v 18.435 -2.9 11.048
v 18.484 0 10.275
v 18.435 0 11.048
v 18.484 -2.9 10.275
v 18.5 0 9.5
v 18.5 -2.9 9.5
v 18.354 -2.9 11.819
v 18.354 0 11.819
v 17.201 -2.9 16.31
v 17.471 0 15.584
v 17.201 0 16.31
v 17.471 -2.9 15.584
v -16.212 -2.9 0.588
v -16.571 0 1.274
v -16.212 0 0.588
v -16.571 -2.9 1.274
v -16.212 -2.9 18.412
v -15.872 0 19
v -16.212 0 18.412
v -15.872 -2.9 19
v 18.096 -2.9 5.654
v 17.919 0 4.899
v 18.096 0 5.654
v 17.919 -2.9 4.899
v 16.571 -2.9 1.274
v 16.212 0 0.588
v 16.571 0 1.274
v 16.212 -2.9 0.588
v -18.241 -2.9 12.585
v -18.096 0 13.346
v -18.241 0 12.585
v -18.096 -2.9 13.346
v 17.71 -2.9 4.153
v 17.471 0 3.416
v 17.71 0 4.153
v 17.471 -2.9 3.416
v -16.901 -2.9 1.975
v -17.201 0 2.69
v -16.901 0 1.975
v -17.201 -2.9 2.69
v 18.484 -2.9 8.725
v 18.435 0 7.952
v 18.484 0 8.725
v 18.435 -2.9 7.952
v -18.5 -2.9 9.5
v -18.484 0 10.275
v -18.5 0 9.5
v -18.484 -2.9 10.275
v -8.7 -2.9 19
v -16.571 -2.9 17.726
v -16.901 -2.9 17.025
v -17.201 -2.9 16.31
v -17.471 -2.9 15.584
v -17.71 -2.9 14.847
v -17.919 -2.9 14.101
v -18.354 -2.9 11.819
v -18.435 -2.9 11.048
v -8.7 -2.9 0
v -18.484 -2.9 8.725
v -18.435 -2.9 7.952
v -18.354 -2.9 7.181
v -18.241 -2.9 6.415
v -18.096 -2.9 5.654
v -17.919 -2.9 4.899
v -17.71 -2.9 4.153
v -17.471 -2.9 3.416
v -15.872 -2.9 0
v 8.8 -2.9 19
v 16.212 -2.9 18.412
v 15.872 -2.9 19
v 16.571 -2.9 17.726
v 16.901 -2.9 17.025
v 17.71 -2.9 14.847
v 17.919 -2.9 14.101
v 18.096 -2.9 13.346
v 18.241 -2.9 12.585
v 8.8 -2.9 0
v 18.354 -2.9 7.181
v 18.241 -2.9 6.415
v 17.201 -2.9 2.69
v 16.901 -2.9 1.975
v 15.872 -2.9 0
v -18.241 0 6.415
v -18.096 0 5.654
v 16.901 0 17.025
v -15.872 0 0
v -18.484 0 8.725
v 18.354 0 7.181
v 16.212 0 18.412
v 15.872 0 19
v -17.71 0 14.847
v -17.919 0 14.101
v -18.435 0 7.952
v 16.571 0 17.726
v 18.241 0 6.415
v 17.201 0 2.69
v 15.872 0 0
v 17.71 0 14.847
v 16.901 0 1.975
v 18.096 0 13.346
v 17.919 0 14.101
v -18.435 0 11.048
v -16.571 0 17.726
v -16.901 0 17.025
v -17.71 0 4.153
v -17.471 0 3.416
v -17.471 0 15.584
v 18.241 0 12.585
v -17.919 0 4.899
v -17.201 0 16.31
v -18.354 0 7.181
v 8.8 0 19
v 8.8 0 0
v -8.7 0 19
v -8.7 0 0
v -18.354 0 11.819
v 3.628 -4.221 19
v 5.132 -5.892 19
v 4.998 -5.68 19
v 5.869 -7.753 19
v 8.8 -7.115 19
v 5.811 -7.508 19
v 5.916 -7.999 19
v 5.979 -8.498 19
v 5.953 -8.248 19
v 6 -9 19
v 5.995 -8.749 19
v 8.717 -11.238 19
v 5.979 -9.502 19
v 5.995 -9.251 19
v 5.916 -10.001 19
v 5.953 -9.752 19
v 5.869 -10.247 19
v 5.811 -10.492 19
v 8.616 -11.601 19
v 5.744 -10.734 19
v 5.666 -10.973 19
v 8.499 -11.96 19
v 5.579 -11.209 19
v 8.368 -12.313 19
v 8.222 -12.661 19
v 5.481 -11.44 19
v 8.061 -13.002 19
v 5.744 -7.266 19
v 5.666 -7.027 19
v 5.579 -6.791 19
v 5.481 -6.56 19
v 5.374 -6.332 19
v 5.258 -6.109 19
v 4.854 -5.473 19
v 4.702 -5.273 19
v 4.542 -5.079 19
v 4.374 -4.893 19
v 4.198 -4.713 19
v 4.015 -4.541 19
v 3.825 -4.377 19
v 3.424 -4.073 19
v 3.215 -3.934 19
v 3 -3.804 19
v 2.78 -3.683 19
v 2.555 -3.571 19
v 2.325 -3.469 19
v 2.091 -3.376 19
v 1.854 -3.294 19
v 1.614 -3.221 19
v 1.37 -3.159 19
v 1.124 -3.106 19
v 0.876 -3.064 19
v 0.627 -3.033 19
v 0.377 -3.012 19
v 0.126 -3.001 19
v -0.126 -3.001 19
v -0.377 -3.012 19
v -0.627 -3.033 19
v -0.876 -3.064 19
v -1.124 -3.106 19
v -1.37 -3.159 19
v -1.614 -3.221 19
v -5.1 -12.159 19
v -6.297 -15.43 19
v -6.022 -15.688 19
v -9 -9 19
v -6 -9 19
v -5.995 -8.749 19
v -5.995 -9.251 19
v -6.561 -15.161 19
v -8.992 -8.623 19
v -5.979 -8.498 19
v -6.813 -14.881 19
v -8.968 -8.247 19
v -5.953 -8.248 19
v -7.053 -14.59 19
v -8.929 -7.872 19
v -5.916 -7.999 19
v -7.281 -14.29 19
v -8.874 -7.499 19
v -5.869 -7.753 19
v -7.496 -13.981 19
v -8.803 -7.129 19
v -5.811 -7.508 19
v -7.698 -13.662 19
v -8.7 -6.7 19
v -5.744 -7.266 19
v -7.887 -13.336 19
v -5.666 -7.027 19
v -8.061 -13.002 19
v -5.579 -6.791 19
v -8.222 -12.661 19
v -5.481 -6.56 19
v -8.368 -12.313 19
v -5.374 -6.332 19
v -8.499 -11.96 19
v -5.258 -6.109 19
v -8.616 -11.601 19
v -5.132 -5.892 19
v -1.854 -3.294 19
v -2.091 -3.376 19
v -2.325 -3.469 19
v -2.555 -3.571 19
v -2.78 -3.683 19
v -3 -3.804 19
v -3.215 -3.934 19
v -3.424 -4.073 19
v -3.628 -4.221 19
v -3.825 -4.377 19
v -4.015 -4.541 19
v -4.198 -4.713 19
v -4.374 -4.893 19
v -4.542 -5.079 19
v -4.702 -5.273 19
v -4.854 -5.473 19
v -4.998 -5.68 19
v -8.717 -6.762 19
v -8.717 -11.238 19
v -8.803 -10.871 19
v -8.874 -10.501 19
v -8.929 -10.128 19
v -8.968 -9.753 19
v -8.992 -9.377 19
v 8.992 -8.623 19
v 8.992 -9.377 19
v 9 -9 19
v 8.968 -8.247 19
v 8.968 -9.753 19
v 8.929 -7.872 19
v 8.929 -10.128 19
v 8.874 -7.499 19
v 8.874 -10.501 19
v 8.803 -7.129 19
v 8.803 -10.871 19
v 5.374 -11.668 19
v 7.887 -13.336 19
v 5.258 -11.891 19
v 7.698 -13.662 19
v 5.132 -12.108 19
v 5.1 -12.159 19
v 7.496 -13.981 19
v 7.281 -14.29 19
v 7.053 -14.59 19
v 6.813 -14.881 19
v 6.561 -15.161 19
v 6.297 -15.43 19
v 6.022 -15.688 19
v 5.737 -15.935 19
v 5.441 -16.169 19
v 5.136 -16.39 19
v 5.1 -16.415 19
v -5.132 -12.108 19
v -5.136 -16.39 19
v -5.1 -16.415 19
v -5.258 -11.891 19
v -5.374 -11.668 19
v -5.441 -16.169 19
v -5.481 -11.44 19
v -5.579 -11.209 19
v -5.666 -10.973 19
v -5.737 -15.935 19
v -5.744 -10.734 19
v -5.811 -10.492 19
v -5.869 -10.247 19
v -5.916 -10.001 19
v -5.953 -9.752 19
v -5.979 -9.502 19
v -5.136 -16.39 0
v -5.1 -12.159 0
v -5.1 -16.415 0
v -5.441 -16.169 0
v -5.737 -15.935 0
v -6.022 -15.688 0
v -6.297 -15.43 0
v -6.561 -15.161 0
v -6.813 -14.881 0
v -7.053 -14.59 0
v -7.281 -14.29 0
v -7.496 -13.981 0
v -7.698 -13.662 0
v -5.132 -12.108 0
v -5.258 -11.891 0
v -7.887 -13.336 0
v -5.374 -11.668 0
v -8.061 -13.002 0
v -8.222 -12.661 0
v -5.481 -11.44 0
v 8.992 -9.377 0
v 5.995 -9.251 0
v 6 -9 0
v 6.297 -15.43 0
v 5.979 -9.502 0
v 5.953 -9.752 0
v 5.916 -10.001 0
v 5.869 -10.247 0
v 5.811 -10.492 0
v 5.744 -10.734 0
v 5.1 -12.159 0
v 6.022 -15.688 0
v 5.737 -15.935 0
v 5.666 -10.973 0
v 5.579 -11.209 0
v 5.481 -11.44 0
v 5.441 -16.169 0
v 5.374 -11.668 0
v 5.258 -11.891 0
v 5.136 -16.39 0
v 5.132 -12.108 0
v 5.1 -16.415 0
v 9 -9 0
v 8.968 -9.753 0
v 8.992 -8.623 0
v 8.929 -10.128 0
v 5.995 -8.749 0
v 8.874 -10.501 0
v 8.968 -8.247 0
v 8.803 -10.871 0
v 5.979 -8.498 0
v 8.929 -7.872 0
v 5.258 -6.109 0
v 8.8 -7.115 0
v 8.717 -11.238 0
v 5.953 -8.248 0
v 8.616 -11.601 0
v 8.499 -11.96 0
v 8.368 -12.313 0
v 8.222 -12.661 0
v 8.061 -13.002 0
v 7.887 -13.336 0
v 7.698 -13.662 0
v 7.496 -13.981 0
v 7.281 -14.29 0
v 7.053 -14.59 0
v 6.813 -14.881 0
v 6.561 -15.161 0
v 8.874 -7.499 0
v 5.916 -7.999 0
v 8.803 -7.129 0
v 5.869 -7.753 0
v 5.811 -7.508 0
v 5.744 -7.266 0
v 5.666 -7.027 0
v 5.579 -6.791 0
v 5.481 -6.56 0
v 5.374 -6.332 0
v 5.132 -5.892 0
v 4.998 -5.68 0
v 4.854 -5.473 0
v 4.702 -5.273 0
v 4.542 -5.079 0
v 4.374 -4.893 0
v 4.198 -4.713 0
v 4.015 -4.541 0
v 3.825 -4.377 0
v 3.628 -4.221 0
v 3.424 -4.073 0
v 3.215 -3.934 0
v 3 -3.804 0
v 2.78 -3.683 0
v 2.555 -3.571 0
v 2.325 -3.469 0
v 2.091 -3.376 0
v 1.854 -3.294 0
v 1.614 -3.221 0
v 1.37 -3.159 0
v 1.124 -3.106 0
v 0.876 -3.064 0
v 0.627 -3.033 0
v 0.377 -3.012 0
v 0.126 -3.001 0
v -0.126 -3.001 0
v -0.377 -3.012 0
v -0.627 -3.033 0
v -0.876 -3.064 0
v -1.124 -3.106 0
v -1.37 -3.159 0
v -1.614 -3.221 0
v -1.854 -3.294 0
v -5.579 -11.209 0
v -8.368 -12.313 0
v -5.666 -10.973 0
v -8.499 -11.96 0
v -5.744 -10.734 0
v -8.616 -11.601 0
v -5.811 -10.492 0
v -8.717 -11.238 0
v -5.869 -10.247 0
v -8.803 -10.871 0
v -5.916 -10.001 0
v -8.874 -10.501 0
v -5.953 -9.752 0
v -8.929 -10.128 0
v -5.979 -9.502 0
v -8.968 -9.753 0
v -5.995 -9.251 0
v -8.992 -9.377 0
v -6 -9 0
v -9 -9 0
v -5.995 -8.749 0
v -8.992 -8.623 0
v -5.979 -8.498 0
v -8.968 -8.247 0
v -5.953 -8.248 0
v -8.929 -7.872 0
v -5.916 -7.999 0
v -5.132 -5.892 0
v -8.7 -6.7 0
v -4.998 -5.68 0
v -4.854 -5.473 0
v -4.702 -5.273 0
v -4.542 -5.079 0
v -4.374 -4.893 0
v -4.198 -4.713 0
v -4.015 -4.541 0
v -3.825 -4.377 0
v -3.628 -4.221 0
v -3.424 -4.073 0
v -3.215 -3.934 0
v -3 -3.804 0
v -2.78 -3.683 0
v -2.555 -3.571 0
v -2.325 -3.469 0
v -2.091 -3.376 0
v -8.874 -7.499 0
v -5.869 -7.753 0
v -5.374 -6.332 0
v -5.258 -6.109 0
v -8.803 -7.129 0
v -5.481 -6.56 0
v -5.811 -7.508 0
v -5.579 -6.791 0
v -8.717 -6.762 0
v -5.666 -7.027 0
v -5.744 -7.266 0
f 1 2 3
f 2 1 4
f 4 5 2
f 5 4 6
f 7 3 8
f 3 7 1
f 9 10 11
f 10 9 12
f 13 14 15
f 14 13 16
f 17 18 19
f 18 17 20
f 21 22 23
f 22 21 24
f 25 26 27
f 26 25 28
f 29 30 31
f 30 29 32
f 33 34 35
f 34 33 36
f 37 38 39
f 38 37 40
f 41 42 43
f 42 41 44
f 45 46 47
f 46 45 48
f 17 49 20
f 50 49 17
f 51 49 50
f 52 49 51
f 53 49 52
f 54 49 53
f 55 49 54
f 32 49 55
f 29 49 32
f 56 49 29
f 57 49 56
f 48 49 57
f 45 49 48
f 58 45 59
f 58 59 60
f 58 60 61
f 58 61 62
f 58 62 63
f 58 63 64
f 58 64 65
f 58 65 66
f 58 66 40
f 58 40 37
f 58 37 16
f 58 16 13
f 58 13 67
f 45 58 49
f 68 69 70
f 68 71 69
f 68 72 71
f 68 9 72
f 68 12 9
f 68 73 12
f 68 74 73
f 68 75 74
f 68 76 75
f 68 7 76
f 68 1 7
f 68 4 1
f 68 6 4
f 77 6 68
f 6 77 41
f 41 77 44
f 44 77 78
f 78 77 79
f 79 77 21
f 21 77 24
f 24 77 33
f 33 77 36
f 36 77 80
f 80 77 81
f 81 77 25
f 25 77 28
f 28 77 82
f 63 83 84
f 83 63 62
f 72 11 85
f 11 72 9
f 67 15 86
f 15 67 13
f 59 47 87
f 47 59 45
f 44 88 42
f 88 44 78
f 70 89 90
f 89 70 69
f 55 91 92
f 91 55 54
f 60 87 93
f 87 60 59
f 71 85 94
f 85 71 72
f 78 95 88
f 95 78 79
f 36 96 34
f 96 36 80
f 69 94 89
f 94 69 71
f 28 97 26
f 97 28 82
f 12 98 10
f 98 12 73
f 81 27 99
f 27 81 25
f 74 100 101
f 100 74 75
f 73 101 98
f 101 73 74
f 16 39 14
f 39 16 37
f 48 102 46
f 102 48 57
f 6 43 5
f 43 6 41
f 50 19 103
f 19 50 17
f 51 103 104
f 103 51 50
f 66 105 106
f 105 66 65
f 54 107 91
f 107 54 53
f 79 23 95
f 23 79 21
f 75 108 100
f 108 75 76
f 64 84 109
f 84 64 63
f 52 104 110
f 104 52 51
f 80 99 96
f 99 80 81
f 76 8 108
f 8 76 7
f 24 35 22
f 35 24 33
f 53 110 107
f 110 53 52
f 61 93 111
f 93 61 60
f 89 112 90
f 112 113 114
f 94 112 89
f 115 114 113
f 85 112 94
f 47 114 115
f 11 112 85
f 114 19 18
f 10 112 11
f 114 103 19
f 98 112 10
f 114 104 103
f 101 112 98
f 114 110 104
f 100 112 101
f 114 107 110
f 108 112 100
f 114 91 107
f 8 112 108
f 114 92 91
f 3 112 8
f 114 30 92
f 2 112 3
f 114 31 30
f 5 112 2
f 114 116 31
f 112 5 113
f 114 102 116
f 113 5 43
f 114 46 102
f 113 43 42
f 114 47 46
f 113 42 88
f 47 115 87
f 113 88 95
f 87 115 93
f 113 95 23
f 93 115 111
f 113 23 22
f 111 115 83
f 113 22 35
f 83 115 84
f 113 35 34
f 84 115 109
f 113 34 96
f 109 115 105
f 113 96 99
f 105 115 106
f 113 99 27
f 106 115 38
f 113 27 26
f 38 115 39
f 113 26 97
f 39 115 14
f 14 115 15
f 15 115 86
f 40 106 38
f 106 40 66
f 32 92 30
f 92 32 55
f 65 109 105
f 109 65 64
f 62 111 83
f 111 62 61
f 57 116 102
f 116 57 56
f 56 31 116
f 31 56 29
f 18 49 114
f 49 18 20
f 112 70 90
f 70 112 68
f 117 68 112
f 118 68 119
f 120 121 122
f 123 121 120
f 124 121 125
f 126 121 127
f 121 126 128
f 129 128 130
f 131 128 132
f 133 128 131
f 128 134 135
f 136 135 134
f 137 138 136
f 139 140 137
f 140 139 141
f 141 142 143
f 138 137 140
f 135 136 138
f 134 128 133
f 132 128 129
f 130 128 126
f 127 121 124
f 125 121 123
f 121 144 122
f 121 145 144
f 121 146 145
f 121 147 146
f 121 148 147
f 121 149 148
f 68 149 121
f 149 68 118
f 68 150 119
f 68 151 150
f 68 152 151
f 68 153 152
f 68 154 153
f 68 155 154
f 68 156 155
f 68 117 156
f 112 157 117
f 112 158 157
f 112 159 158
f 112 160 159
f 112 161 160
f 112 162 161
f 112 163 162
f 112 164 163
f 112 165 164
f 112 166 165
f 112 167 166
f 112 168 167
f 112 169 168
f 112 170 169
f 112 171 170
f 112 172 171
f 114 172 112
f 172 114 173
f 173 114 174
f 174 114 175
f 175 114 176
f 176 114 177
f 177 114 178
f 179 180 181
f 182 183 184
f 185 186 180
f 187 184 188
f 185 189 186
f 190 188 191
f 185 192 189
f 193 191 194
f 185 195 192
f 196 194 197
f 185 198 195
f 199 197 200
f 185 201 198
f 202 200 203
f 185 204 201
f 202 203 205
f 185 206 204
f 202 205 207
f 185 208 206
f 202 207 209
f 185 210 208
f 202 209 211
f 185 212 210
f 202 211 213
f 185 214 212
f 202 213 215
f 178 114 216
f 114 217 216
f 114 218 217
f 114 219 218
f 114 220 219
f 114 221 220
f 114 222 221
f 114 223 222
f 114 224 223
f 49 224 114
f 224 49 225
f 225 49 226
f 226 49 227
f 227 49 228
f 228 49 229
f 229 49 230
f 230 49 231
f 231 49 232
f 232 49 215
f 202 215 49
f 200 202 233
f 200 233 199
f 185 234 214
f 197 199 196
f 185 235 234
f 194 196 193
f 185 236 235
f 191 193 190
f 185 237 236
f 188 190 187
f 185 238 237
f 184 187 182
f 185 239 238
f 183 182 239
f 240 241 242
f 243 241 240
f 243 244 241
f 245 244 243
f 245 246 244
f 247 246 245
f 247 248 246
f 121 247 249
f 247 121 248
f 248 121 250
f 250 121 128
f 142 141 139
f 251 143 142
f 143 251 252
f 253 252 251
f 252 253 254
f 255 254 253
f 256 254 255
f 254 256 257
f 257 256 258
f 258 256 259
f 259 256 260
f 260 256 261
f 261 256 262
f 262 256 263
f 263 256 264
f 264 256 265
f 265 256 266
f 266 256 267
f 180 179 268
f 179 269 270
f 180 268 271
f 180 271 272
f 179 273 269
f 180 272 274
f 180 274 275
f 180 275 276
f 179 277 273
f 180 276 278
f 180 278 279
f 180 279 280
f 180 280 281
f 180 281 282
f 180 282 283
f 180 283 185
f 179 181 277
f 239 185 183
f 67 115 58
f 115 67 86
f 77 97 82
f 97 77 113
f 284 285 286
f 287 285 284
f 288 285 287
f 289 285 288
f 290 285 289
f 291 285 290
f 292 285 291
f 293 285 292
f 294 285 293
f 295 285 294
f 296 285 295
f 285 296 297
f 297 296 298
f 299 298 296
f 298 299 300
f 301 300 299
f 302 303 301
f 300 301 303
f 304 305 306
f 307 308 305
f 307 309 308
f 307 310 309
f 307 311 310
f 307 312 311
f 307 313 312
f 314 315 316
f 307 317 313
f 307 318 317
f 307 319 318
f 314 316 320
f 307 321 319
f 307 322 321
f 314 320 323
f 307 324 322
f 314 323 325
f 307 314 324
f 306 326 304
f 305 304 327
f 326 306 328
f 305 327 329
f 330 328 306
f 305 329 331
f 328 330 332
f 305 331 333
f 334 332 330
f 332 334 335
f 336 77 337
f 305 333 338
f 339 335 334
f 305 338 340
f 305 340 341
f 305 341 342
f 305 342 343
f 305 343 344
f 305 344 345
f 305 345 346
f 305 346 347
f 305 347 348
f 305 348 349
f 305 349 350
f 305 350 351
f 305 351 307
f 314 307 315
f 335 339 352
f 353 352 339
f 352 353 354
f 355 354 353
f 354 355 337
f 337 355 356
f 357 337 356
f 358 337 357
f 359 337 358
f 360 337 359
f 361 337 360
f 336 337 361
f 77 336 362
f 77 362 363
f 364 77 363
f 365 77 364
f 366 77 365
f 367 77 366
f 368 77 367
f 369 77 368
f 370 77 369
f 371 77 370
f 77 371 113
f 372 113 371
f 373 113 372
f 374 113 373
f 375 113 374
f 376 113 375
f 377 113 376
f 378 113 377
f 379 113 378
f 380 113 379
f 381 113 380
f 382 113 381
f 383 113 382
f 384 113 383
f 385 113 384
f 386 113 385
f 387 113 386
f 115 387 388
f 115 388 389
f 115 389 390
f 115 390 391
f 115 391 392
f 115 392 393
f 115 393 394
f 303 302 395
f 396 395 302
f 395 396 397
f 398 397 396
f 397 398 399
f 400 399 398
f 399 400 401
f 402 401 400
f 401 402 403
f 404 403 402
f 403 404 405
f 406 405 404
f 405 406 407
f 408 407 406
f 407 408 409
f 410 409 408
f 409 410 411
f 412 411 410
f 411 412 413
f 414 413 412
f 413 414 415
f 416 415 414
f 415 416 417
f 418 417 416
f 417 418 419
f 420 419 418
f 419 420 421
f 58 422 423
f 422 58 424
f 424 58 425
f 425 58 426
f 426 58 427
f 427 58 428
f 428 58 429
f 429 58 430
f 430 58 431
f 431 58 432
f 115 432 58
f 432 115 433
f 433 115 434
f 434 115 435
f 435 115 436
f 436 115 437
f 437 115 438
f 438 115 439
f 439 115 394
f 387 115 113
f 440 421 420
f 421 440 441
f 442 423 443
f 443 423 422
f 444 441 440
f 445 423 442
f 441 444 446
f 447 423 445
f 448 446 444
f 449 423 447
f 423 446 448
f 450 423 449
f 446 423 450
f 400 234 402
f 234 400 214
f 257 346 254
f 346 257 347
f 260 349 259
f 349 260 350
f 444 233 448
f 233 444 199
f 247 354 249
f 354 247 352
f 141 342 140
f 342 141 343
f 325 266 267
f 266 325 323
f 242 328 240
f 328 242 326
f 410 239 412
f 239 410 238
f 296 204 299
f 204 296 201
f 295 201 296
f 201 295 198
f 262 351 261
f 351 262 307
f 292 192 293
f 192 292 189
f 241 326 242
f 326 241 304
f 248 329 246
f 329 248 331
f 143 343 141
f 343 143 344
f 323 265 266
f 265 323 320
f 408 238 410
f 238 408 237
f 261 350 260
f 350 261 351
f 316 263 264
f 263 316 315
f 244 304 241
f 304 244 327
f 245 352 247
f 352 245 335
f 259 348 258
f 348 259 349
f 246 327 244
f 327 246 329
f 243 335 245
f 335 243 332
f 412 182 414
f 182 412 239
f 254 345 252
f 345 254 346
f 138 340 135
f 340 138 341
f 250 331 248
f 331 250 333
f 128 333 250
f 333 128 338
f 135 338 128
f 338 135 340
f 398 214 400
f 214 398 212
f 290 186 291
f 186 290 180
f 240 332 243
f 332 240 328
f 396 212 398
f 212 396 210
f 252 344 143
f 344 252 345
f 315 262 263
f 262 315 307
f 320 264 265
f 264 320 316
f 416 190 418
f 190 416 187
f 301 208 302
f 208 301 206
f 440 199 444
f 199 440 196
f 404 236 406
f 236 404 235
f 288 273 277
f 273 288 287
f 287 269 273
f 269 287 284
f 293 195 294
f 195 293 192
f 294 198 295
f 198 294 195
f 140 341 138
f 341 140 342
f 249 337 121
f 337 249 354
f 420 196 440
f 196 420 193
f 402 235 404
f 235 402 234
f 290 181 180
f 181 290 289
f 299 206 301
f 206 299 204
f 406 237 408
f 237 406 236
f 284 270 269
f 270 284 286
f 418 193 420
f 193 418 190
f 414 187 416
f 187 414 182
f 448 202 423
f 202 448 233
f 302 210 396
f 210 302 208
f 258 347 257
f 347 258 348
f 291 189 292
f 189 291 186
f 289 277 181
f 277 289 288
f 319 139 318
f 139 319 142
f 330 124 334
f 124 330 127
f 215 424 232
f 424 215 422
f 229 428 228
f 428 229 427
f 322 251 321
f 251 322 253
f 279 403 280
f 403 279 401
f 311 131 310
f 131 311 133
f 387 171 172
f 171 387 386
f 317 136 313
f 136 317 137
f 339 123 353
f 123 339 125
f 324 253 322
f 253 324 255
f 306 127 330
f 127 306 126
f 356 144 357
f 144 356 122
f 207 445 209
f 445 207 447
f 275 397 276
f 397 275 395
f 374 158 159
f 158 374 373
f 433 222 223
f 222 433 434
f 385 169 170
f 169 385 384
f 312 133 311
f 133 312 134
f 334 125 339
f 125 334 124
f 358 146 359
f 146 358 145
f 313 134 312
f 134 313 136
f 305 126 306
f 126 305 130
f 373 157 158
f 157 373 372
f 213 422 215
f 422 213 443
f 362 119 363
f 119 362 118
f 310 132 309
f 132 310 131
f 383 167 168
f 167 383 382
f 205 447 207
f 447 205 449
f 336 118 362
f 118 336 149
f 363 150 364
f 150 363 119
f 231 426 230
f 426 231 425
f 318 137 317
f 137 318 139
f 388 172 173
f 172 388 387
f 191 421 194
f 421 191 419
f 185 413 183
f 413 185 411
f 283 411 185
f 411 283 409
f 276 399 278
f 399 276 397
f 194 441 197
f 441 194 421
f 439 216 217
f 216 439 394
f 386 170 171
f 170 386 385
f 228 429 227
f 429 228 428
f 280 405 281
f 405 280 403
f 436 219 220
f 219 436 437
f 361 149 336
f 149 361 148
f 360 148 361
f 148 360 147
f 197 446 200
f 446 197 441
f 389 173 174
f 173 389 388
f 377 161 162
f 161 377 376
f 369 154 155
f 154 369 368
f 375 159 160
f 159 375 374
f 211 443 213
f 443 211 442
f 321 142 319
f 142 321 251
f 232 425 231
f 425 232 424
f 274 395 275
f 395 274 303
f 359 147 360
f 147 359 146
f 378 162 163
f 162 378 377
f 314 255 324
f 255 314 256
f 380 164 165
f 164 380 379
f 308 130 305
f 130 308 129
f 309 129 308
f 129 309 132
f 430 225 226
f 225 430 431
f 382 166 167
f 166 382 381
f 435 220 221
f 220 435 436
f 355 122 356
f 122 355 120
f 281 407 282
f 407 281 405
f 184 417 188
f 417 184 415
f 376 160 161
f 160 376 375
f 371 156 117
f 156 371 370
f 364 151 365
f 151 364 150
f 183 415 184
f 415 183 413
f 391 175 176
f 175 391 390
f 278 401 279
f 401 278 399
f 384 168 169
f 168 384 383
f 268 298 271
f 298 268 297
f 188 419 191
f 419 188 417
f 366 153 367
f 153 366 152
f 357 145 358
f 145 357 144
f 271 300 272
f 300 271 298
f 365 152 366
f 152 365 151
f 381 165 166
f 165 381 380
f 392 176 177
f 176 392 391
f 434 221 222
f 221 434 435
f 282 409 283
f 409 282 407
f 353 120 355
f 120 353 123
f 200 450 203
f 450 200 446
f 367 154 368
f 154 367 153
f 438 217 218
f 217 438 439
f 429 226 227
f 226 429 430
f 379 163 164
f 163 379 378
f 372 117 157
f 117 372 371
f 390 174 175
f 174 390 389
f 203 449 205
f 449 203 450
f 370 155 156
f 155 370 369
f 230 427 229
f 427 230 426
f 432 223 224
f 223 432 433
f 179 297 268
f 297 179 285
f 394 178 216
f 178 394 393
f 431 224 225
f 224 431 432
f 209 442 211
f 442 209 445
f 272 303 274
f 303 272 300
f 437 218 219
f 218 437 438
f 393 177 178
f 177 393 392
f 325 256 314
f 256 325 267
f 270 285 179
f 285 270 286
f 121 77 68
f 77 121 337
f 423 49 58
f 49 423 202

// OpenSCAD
$fn=150+0;
// offset 0 is like the original part. you can offset for instance 2cm by entering 20 here:
offset=0;

rotate([90,0,0]) translate([0,9.5,0])
union(){
    difference(){
        cylinder(r=18.5, h=2.9);
        translate([-19,9.5,-0.5]) cube([38,20,4]);
        translate([-19,-29.5,-0.5]) cube([38,20,4]);
    }
    
    translate([0,0,0+offset])
    difference(){
        translate([0,9.5,9]) rotate([90,0,0]) cylinder(d=18,h=19);
        translate([0,10,9]) rotate([90,0,0]) cylinder(d=12,h=20);

        translate([-5.1,-11,10]) cube([10.2, 21, 20]);
    }
    
    difference(){
        translate([-8.7,-9.5,0]) cube([17.5,19,8+offset]);
        translate([0,10,9+offset]) rotate([90,0,0]) cylinder(d=12,h=20);
    }
}
